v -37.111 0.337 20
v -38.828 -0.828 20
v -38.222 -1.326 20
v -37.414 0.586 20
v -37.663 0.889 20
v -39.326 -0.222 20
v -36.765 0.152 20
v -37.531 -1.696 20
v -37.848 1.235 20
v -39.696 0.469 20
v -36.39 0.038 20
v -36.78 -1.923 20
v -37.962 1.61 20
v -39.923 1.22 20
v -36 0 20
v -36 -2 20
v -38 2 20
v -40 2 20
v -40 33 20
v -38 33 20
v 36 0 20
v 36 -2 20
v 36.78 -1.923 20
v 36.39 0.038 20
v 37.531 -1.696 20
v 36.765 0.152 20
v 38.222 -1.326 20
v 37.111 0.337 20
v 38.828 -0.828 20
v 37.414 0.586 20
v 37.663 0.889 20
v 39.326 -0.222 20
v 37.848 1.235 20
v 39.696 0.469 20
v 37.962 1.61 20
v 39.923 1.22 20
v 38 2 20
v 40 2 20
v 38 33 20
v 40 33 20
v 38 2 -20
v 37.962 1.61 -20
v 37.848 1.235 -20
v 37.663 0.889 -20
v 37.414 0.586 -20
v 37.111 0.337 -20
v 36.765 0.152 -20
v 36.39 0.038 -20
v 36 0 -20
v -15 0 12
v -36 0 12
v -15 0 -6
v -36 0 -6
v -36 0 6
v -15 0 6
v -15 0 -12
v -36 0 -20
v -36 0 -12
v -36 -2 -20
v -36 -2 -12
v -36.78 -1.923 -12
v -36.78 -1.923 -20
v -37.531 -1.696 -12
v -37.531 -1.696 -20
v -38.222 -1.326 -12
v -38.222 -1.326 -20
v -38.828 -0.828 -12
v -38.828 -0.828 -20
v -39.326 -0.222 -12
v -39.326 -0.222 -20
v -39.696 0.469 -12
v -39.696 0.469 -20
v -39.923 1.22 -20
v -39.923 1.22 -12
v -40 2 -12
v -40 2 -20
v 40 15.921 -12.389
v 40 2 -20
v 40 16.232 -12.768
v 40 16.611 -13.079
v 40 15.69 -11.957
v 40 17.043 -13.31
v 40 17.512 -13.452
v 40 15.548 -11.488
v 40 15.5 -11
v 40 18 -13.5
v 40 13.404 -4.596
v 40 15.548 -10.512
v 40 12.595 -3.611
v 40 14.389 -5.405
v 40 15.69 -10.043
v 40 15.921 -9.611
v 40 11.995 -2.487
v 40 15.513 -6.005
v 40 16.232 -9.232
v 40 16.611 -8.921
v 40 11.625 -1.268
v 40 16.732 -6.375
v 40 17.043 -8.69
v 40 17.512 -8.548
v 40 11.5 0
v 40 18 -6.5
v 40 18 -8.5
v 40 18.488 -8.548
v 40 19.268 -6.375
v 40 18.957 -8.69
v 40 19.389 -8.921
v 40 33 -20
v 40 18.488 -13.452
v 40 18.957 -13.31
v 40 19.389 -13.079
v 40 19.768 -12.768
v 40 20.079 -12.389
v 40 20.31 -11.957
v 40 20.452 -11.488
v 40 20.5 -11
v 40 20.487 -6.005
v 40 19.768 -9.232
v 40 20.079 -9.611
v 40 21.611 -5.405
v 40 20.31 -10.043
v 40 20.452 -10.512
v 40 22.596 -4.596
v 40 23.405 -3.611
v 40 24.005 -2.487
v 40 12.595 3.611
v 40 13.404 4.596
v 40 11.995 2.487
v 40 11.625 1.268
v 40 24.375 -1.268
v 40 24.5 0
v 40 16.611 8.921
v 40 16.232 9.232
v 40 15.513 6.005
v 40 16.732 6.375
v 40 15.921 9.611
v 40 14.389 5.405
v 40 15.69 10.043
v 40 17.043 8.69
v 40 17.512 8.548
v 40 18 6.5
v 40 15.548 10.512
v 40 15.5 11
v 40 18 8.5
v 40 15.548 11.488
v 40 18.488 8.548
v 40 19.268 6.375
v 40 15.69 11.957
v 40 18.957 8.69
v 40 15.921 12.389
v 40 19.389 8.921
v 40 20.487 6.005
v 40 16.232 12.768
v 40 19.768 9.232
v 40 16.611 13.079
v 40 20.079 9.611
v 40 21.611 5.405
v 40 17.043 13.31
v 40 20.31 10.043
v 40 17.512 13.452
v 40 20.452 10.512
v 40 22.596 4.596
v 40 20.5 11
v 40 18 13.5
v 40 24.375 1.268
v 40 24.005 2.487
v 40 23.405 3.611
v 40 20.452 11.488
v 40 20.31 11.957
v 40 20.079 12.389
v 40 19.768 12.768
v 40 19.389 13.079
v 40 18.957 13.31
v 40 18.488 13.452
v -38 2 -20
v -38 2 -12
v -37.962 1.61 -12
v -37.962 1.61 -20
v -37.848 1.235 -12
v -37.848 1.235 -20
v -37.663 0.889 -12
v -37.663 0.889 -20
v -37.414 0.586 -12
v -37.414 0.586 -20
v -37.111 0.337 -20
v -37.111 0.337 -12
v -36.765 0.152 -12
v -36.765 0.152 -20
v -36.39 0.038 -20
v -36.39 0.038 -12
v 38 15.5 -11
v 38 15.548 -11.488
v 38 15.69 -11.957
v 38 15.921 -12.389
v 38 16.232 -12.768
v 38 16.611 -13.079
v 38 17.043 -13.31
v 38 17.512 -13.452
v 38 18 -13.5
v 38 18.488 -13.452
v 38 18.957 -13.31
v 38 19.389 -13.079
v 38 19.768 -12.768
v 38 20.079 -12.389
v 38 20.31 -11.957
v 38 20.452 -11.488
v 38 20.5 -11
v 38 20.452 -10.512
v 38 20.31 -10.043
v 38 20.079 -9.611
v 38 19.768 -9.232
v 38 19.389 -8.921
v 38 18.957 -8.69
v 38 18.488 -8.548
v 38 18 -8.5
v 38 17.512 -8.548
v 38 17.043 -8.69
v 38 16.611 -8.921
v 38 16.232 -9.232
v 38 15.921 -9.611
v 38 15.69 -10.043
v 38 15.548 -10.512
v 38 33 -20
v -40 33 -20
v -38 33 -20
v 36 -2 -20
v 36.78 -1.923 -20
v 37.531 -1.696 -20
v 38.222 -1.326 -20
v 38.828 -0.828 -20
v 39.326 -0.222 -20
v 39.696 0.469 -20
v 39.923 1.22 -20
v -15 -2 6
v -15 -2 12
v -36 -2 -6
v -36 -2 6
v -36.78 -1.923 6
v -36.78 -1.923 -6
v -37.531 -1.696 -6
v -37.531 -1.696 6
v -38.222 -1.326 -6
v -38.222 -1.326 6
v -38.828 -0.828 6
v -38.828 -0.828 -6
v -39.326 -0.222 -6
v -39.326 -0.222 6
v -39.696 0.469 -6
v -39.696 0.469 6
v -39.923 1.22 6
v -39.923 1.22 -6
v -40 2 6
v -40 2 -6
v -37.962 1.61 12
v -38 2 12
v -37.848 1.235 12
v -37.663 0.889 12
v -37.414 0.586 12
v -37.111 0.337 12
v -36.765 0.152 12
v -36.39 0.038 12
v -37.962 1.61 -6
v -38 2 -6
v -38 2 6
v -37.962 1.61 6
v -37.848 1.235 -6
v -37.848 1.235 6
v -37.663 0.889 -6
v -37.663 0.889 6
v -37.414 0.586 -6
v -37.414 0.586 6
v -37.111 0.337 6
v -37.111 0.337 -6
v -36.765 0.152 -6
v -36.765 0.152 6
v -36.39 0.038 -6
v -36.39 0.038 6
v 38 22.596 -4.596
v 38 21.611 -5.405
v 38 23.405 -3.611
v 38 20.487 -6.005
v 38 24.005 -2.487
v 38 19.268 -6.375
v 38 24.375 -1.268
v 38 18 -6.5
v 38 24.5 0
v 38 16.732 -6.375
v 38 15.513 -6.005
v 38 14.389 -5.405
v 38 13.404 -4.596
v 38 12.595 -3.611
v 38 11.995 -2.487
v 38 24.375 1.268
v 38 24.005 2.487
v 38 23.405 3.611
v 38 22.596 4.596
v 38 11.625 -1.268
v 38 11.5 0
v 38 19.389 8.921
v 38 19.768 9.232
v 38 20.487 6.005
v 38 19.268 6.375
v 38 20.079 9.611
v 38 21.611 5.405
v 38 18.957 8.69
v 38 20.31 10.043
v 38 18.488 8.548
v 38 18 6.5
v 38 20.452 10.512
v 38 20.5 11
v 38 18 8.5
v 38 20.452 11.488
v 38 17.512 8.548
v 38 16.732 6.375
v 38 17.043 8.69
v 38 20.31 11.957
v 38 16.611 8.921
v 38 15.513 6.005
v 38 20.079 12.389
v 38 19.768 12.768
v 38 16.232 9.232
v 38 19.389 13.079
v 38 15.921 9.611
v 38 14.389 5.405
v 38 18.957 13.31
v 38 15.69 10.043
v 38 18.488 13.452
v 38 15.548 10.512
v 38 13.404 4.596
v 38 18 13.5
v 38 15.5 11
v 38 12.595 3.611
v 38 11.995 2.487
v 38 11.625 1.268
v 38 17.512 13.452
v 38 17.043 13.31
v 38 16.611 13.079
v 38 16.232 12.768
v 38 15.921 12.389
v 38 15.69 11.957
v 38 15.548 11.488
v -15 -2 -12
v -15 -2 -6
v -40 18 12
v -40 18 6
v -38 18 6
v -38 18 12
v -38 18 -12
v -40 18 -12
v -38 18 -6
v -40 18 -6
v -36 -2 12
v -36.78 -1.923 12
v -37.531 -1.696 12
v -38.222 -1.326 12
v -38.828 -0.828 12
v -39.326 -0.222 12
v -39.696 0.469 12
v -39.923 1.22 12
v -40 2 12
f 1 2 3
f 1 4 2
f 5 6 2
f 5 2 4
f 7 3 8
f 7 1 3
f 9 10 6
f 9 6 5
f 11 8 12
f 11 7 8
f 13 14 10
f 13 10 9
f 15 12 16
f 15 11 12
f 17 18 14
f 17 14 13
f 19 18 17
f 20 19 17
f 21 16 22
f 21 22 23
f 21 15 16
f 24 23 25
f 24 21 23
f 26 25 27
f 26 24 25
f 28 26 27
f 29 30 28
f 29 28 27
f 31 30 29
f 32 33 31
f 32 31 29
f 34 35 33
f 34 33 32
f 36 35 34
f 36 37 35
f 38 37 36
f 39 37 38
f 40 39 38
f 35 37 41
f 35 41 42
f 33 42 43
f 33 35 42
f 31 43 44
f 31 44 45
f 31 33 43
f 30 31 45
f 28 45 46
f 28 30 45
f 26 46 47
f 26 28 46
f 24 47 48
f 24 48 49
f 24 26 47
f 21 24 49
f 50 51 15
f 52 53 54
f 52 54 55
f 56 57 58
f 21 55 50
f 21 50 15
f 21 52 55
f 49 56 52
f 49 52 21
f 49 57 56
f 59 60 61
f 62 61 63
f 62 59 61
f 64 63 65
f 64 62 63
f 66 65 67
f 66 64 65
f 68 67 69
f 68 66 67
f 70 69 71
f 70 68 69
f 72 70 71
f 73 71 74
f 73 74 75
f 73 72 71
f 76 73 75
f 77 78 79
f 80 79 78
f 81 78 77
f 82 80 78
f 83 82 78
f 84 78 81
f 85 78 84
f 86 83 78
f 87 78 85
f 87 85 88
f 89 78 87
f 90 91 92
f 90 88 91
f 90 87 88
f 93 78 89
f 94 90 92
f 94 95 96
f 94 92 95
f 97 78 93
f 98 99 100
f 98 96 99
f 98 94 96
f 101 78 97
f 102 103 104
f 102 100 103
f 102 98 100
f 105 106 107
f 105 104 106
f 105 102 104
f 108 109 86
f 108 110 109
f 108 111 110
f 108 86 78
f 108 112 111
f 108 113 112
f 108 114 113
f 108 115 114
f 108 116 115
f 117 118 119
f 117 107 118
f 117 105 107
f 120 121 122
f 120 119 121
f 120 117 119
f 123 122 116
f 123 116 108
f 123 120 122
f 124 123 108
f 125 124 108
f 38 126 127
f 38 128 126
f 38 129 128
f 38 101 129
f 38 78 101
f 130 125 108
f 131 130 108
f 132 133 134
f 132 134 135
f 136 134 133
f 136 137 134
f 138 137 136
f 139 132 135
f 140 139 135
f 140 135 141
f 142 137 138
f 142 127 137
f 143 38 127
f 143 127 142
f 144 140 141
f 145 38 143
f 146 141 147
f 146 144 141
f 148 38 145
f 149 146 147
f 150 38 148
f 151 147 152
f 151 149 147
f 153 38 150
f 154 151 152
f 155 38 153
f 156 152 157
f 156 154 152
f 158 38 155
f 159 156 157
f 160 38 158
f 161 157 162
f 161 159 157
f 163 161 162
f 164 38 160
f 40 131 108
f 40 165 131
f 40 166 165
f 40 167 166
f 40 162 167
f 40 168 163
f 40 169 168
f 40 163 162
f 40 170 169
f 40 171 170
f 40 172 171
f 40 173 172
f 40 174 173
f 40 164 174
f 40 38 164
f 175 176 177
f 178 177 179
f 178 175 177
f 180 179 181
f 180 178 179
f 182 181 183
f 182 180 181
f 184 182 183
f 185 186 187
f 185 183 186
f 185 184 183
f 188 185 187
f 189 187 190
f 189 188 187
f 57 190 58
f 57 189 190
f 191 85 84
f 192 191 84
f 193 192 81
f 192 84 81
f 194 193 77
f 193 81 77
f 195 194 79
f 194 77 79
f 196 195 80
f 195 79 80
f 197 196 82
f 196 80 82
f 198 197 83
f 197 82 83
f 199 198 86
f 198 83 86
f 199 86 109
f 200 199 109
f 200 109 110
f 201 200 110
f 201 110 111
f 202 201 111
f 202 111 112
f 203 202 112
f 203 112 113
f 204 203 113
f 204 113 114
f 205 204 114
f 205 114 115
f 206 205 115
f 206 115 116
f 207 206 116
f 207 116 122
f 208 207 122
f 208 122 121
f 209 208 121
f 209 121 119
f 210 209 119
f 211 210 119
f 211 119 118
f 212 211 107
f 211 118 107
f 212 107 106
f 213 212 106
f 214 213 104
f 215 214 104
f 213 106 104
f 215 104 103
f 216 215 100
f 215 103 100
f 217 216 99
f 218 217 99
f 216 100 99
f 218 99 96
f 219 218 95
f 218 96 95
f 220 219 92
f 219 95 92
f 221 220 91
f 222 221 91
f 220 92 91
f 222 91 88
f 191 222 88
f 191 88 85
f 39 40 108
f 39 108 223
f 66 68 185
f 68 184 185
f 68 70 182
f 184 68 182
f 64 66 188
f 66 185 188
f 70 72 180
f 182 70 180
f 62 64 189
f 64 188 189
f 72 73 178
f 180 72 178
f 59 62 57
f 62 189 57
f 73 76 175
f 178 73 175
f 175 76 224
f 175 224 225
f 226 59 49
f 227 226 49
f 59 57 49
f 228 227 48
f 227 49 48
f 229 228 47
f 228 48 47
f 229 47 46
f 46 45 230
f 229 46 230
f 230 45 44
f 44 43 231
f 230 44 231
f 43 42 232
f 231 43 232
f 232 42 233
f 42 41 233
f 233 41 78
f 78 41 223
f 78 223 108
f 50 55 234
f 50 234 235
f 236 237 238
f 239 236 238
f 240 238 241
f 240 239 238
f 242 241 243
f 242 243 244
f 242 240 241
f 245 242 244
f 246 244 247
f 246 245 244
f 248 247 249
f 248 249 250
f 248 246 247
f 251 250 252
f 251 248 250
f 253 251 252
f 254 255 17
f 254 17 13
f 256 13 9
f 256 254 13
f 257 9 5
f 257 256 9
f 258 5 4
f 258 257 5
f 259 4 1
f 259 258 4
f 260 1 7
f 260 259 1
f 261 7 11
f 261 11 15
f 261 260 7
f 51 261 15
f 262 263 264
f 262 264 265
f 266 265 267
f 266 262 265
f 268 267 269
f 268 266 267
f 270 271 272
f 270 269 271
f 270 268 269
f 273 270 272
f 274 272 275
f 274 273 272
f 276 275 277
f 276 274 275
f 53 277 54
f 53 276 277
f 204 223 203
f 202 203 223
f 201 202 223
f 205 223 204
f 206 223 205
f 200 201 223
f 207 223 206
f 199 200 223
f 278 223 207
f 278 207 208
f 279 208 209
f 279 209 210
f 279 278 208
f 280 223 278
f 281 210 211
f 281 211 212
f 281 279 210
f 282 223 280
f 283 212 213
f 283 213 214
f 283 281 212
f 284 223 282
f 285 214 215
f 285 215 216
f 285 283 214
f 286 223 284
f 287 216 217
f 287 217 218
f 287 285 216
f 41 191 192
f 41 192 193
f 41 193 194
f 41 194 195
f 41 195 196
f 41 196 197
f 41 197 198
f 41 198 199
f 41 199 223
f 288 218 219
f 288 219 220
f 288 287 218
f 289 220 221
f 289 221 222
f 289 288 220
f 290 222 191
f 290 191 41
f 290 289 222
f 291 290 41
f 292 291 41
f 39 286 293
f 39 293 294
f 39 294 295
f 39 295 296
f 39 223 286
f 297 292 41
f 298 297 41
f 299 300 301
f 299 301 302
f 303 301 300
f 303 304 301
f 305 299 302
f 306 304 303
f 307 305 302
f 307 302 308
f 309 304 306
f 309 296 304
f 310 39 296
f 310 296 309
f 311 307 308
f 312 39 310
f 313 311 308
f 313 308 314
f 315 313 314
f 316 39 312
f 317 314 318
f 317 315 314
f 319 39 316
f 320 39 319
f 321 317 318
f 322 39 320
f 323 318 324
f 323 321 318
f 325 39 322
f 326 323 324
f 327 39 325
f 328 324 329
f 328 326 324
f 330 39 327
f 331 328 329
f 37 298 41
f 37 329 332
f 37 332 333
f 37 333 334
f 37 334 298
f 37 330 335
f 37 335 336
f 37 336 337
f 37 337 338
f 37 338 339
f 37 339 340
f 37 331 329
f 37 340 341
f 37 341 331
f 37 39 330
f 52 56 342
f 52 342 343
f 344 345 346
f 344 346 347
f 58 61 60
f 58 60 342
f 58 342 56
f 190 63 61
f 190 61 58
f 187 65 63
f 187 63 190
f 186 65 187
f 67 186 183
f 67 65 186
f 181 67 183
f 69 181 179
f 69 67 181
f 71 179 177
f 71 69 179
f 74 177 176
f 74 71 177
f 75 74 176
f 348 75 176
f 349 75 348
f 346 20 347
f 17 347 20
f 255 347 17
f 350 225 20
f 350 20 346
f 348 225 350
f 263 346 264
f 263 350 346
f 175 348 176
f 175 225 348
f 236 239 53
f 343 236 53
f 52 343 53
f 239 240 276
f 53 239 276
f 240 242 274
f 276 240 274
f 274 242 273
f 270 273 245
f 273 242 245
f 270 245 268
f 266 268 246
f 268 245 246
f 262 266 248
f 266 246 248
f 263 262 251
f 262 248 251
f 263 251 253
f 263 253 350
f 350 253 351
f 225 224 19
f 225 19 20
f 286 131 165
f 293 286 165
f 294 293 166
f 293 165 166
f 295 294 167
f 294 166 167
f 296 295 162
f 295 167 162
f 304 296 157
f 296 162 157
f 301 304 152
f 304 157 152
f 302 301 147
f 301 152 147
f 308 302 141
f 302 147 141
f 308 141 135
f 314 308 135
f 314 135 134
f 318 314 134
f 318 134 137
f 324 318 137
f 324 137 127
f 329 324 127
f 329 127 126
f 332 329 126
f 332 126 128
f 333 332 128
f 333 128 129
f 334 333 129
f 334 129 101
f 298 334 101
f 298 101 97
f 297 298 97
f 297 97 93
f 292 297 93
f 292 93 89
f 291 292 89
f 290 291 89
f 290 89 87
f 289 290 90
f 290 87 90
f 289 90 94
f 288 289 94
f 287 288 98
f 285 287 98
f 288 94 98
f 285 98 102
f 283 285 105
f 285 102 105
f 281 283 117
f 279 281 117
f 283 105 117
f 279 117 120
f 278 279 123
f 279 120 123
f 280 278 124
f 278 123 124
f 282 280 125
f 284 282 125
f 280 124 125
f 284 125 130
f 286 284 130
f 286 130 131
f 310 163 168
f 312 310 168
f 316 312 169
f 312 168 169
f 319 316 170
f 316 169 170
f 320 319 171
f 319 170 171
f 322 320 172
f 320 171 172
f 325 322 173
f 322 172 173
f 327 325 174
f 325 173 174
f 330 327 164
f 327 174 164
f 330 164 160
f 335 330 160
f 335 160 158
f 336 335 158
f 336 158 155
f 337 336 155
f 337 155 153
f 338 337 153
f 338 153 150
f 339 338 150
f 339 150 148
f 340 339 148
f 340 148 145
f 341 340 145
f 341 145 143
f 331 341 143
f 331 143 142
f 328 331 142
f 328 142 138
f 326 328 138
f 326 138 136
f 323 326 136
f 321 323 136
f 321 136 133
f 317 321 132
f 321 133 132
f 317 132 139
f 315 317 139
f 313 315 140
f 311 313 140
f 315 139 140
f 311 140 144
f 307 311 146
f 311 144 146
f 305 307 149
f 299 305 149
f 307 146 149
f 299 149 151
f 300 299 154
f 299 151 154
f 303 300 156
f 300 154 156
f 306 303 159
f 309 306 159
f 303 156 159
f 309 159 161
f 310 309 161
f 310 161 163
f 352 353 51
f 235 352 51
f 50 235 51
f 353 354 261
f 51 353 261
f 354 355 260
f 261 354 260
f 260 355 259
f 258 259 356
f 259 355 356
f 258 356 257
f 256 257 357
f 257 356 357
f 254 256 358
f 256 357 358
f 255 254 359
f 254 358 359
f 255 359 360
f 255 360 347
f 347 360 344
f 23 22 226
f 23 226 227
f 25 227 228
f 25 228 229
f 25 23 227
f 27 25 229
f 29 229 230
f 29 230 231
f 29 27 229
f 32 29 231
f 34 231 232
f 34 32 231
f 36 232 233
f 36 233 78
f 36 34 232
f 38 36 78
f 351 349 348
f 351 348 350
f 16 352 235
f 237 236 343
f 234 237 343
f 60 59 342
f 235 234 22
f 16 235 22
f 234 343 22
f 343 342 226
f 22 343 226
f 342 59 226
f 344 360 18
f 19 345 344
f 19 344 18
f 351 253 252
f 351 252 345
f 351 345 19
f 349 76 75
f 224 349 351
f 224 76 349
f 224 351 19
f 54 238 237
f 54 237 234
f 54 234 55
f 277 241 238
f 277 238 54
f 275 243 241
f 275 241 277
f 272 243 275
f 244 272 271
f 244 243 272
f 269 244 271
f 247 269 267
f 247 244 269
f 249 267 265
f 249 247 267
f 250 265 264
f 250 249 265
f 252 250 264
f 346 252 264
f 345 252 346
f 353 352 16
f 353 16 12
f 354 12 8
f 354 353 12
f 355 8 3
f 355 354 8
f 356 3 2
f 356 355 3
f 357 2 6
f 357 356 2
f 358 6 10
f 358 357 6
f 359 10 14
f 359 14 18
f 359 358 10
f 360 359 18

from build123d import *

# Parameters (mm, degrees)
SKETCH1_W                      = 80
SKETCH1_H                      = 40
BASE_FLANGE1_DEPTH             = 2
EDGE_FLANGE1_STRIP_W           = 12
EDGE_FLANGE1_STRIP_H           = 2
EDGE_FLANGE1_STRIP_CUT_DEPTH   = 40
EDGE_FLANGE1_STRIP_2_W         = 12
EDGE_FLANGE1_STRIP_2_H         = 2
EDGE_FLANGE1_STRIP_CUT_2_DEPTH = 40
EDGE_FLANGE1_DEPTH             = 40
EDGE_FLANGE1_BEND_DEPTH        = 40
SKETCH12_R                     = 6.5
SKETCH12_R_2                   = 2.5
CUT_EXTRUDE1_DEPTH             = 10
SKETCH13_W                     = 6
SKETCH13_H                     = 40
CUT_EXTRUDE2_DEPTH             = 25


# Sheet-metal steps are written as plain solids
with BuildPart() as part:
    # Sketch1 → Base-Flange1 (new body)
    with BuildSketch(Plane(origin=(0, 0, 0), x_dir=(1, 0, 0), z_dir=(0, 1, 0))):
        Rectangle(SKETCH1_W, SKETCH1_H)
    extrude(amount=-BASE_FLANGE1_DEPTH)

    # Edge-Flange1 strip (across the edge) → Edge-Flange1 strip cut (cut)
    with BuildSketch(Plane(origin=(-40, 0, -20), x_dir=(1, 0, 0), z_dir=(0, 0, 1))):
        with Locations((-2, -1)):
            Rectangle(EDGE_FLANGE1_STRIP_W, EDGE_FLANGE1_STRIP_H)
    extrude(amount=EDGE_FLANGE1_STRIP_CUT_DEPTH, mode=Mode.SUBTRACT)

    # Edge-Flange1 strip 2 (across the edge) → Edge-Flange1 strip cut 2 (cut)
    with BuildSketch(Plane(origin=(40, 0, 20), x_dir=(-1, 0, 0), z_dir=(0, 0, -1))):
        with Locations((-2, -1)):
            Rectangle(EDGE_FLANGE1_STRIP_2_W, EDGE_FLANGE1_STRIP_2_H)
    extrude(amount=EDGE_FLANGE1_STRIP_CUT_2_DEPTH, mode=Mode.SUBTRACT)

    # Edge-Flange1 section (across the edge) → Edge-Flange1 (add)
    with BuildSketch(Plane(origin=(-40, 0, -20), x_dir=(1, 0, 0), z_dir=(0, 0, 1))):
        with BuildLine():
            Line((0, 2), (0, 33))
            Line((0, 33), (2, 33))
            Line((2, 33), (2, 2))
            ThreePointArc((2, 2), (2.585786438, 0.585786438), (4, 0))
            Line((4, 0), (4, -2))
            ThreePointArc((4, -2), (1.171572875, -0.828427125), (0, 2))
        make_face()
    extrude(amount=EDGE_FLANGE1_DEPTH)

    # Edge-Flange1 section 2 (across the edge) → Edge-Flange1 bend (add)
    with BuildSketch(Plane(origin=(40, 0, 20), x_dir=(-1, 0, 0), z_dir=(0, 0, -1))):
        with BuildLine():
            Line((0, 2), (0, 33))
            Line((0, 33), (2, 33))
            Line((2, 33), (2, 2))
            ThreePointArc((2, 2), (2.585786438, 0.585786438), (4, 0))
            Line((4, 0), (4, -2))
            ThreePointArc((4, -2), (1.171572875, -0.828427125), (0, 2))
        make_face()
    extrude(amount=EDGE_FLANGE1_BEND_DEPTH)

    # Sketch12 → Cut-Extrude1 (cut)
    with BuildSketch(Plane(origin=(40, 0, 0), x_dir=(0, 0, -1), z_dir=(1, 0, 0))):
        with Locations(Location((0, 18, 0), (0, 0, 90))):
            Circle(SKETCH12_R)
        with Locations(Location((-11, 18, 0), (0, 0, 90))):
            Circle(SKETCH12_R_2)
        with Locations(Location((11, 18, 0), (0, 0, 270))):
            Circle(SKETCH12_R_2)
    extrude(amount=-CUT_EXTRUDE1_DEPTH, mode=Mode.SUBTRACT)

    # Sketch13 → Cut-Extrude2 (cut)
    with BuildSketch(Plane.ZY.offset(40)):
        with Locations((9, -2)):
            Rectangle(SKETCH13_W, SKETCH13_H)
        with Locations((-9, -2)):
            Rectangle(SKETCH13_W, SKETCH13_H)
    extrude(amount=-CUT_EXTRUDE2_DEPTH, mode=Mode.SUBTRACT)


solid = part.part
